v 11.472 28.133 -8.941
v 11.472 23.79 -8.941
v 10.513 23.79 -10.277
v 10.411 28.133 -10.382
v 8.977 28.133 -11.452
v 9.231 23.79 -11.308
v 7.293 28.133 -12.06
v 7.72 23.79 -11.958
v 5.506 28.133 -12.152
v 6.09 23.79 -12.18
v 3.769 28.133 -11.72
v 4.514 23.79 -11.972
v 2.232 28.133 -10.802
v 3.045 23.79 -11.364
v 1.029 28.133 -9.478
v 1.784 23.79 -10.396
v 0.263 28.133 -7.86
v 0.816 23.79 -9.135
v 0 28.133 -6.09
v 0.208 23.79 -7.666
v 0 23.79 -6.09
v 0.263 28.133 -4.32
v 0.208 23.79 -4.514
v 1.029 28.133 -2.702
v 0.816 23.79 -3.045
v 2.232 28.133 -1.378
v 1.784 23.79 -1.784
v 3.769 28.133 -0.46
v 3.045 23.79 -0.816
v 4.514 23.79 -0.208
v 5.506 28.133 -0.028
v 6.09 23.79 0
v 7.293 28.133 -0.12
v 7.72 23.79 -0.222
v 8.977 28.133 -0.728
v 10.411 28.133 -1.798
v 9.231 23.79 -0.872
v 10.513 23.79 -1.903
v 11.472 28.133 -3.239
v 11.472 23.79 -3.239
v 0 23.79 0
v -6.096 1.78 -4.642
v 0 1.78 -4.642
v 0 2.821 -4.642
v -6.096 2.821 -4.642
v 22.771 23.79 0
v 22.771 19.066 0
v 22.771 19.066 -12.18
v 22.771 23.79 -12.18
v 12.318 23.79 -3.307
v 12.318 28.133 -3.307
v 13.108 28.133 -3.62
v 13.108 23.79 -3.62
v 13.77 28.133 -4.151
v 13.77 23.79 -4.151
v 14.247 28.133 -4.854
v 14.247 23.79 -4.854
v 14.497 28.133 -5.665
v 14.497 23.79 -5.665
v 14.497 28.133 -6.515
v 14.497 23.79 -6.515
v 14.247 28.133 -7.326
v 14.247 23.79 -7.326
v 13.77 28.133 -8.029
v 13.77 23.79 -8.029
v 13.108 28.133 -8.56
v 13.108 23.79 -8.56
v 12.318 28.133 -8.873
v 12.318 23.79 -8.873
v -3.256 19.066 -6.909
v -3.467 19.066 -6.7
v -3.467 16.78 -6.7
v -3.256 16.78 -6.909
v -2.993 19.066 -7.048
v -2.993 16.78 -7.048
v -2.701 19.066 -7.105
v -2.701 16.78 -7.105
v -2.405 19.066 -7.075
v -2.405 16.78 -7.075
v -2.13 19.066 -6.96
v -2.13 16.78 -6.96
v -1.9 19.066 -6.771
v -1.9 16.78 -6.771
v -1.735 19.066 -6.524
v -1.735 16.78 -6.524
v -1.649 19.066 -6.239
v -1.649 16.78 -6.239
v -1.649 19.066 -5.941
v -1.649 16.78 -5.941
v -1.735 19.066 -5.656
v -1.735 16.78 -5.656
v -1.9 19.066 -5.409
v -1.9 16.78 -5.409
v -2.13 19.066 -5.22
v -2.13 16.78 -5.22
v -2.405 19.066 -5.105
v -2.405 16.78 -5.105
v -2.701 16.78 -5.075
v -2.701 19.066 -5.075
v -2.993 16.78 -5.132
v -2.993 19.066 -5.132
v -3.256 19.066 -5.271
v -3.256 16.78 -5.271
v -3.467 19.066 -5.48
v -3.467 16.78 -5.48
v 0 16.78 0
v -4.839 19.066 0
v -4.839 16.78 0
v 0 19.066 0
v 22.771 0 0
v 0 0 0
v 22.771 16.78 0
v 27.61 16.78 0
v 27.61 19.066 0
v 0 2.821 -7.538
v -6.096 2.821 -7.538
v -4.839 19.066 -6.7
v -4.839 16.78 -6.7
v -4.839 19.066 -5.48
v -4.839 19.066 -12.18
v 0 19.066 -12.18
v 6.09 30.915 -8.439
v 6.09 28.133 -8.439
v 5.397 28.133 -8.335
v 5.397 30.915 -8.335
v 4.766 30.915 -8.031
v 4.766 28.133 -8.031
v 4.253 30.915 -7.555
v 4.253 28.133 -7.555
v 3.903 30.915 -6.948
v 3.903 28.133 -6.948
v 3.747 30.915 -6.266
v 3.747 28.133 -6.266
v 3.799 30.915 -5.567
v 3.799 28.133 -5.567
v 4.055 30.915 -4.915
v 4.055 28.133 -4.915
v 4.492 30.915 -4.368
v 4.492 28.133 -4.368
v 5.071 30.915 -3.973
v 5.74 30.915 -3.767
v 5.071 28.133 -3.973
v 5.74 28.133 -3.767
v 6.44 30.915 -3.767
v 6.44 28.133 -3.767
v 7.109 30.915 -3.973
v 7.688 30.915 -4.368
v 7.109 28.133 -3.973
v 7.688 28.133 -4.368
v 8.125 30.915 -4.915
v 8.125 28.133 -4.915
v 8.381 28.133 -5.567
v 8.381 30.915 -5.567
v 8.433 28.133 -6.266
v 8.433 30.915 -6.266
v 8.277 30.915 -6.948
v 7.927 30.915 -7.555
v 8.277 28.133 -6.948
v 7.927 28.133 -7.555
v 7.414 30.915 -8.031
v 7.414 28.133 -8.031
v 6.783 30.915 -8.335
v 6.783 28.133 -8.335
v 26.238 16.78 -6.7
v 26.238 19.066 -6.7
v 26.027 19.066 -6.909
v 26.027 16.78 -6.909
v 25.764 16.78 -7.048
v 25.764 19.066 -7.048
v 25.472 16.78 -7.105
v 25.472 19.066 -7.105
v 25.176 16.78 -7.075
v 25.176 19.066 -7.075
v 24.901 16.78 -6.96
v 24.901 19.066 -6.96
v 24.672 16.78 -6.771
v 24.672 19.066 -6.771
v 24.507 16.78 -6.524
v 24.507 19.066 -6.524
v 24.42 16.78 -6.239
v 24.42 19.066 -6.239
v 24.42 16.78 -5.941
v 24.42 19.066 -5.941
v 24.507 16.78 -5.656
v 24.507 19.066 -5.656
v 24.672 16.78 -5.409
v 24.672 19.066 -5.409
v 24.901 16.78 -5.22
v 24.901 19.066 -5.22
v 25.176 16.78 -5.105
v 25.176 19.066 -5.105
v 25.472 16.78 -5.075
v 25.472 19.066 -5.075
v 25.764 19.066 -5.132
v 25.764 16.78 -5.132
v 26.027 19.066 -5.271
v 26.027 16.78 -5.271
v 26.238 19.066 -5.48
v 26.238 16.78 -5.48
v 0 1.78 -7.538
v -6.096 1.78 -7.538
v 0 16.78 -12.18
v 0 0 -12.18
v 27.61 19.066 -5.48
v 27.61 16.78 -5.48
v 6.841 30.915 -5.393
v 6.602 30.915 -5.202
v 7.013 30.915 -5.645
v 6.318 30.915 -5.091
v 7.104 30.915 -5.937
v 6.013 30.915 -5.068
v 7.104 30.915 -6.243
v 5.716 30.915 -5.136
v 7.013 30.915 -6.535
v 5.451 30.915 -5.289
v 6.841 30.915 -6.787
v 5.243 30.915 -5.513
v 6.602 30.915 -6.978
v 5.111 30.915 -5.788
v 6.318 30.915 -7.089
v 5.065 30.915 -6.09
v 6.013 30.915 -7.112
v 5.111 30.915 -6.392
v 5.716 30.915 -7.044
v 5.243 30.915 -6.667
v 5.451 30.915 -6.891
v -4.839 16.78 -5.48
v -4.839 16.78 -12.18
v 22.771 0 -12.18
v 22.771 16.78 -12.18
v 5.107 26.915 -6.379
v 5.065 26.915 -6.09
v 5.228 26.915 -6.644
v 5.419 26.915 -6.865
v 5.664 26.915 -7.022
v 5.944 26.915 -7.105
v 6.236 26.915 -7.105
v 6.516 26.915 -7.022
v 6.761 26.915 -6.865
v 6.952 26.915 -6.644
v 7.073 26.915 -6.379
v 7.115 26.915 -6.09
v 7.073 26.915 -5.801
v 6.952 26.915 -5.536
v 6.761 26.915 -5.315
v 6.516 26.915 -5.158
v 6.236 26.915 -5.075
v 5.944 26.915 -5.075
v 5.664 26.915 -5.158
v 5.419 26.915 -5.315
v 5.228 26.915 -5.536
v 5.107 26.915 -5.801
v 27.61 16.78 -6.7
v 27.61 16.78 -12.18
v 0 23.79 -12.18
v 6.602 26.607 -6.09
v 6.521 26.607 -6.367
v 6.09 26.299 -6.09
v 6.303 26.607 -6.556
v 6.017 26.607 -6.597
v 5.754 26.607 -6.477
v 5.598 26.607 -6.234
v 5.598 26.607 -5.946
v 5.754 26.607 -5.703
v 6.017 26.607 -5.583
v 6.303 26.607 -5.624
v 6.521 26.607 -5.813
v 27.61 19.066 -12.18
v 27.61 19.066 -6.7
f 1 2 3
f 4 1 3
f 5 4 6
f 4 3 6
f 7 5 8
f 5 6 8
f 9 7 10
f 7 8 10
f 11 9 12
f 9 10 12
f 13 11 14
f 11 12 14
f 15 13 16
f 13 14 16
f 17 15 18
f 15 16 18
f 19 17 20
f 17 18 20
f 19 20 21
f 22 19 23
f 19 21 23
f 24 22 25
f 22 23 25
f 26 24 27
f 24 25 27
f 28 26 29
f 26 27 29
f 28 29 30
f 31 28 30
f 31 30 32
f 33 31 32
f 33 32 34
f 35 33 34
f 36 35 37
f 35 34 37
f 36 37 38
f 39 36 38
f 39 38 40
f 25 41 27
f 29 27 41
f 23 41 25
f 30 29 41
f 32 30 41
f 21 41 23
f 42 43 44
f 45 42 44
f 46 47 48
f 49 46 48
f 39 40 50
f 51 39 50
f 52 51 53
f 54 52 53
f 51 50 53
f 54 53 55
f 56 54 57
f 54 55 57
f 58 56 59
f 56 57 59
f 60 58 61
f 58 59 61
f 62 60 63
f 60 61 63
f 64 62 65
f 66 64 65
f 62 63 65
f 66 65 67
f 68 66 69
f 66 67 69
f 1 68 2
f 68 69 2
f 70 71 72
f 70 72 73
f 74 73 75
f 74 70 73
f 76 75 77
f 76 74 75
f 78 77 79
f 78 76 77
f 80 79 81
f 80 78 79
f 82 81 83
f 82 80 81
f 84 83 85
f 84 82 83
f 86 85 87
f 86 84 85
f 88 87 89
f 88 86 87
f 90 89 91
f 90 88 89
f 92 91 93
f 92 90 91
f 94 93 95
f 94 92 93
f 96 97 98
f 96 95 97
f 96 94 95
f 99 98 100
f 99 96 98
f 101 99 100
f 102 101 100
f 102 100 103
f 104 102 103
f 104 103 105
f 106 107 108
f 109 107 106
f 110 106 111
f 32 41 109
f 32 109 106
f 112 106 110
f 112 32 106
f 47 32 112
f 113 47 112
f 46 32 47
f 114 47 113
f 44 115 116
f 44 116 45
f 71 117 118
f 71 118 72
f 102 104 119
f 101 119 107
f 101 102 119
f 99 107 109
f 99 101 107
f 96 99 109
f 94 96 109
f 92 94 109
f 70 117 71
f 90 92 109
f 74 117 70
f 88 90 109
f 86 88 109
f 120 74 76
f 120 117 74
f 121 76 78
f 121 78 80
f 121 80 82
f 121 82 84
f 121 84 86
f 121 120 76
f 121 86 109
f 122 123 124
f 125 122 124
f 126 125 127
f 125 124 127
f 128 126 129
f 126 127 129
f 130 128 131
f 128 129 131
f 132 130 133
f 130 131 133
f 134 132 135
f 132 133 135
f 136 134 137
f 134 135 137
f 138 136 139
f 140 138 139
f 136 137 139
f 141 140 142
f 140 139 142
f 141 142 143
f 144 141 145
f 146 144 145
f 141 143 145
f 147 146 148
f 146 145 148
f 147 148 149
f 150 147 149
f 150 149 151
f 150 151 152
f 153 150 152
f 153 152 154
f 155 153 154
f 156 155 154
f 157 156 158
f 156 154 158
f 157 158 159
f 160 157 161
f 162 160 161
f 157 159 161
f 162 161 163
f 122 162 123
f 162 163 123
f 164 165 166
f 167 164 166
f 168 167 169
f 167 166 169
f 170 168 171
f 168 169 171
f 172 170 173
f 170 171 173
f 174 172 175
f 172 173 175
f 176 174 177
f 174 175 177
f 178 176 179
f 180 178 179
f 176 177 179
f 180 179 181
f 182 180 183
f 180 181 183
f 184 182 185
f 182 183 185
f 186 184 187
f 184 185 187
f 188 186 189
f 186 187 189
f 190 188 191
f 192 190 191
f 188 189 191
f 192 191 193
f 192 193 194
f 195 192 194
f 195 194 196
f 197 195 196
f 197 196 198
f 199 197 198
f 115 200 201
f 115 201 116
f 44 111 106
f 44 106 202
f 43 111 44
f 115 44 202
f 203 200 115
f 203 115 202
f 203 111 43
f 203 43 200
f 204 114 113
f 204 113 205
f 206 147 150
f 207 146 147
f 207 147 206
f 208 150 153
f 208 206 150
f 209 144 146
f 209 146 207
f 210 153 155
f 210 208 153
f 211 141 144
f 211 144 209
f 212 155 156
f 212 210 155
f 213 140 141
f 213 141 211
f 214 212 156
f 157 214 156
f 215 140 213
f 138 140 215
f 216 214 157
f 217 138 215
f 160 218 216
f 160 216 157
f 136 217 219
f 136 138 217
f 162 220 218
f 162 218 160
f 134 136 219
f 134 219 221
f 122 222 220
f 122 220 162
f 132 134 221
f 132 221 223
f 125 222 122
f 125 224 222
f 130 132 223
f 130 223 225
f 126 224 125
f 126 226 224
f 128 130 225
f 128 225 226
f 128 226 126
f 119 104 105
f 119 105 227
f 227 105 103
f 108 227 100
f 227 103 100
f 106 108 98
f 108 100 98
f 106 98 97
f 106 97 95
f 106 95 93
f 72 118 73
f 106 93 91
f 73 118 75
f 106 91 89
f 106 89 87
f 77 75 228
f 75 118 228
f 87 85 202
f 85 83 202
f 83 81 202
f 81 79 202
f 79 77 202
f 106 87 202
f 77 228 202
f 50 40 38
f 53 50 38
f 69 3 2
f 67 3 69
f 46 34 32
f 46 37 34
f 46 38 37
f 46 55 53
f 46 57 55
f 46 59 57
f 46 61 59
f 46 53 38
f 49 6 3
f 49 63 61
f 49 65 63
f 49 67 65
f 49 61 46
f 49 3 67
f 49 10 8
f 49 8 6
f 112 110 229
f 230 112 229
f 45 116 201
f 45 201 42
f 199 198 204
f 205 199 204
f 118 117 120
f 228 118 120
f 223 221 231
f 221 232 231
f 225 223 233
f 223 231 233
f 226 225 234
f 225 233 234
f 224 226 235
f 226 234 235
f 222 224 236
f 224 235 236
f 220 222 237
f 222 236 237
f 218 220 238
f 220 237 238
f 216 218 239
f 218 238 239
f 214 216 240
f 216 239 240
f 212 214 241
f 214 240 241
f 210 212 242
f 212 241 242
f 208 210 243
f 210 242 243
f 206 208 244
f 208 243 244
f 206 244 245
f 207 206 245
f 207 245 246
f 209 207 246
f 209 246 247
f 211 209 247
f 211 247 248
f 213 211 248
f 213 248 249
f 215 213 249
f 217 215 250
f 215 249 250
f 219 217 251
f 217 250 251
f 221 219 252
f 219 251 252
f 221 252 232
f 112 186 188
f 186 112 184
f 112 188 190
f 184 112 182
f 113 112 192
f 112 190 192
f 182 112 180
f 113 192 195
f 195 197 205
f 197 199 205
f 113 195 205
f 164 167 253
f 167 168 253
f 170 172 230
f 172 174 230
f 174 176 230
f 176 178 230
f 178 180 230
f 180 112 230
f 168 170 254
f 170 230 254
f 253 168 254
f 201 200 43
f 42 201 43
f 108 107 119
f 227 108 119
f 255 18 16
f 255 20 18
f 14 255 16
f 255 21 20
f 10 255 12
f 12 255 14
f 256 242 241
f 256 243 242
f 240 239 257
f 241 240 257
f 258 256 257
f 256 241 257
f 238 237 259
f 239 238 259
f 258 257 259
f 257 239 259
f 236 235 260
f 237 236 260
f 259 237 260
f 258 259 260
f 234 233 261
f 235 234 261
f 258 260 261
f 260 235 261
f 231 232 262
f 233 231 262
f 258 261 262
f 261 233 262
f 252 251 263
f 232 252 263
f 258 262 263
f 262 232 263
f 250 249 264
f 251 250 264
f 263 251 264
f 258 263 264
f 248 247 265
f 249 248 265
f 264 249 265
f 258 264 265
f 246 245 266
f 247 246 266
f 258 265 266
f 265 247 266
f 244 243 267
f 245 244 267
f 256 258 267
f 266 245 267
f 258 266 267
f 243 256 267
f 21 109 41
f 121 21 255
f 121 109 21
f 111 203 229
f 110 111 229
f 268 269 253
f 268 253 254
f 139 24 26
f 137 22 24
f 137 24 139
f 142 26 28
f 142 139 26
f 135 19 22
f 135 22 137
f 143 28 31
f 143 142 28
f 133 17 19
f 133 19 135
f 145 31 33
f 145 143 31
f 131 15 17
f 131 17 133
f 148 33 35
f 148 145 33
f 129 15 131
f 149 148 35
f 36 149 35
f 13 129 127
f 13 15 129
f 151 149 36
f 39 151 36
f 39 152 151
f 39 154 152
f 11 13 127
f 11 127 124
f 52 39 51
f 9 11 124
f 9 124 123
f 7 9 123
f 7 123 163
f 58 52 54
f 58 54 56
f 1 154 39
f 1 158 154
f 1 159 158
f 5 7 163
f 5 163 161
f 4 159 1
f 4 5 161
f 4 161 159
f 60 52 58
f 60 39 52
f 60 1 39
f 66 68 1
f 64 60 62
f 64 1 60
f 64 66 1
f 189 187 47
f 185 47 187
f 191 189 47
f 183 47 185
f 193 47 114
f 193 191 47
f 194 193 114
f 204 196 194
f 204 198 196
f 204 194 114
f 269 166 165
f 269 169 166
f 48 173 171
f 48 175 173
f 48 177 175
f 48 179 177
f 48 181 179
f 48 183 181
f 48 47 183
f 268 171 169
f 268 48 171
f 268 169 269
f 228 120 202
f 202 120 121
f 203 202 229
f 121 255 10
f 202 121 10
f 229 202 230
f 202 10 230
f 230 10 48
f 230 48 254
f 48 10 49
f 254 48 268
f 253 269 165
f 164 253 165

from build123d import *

# Parameters (mm, degrees)
SKETCH1_W                    = 22.7711
SKETCH1_H                    = 12.18
BOSS_EXTRUDE1_DEPTH          = 23.79
SKETCH3_W                    = 32.4485
SKETCH3_H                    = 12.18
BOSS_EXTRUDE2_DEPTH          = 2.286
CUT_EXTRUDE1_DEPTH           = 36.695245613
BOSS_EXTRUDE3_DEPTH          = 4.3434
SKETCH6_R                    = 2.3495
BOSS_EXTRUDE4_DEPTH          = 2.7813
SKETCH7_W                    = 2.8956
SKETCH7_H                    = 1.0414
BOSS_EXTRUDE5_DEPTH          = 6.096
M2_5X0_45_TAPPED_HOLE1_D     = 2.05
M2_5X0_45_TAPPED_HOLE1_DEPTH = 4
M2_5X0_45_TAPPED_HOLE1_TIP   = 0.615882135


with BuildPart() as part:
    # Sketch1 → Boss-Extrude1 (new body)
    with BuildSketch(Plane(origin=(0, 0, 0), x_dir=(1, 0, 0), z_dir=(0, 1, 0))):
        with Locations((11.38555, 6.09)):
            Rectangle(SKETCH1_W, SKETCH1_H)
    extrude(amount=BOSS_EXTRUDE1_DEPTH)

    # Sketch3 → Boss-Extrude2 (add)
    with BuildSketch(Plane(origin=(0, 19.0656, 0), x_dir=(1, 0, 0), z_dir=(0, 1, 0))):
        with Locations((11.38555, 6.09)):
            Rectangle(SKETCH3_W, SKETCH3_H)
    extrude(amount=-BOSS_EXTRUDE2_DEPTH)

    # Sketch4 → Cut-Extrude1 (cut, through all)
    with BuildSketch(Plane(origin=(0, 19.0656, 0), x_dir=(1, 0, 0), z_dir=(0, 1, 0))):
        with BuildLine():
            Line((-4.8387, 6.6996), (-3.4671, 6.6996))
            ThreePointArc((-3.4671, 6.6996), (-1.6383, 6.09), (-3.4671, 5.4804))
            Line((-3.4671, 5.4804), (-4.8387, 5.4804))
            Line((-4.8387, 5.4804), (-4.8387, 6.6996))
        make_face()
        with BuildLine():
            Line((26.2382, 5.4804), (27.6098, 5.4804))
            Line((27.6098, 5.4804), (27.6098, 6.6996))
            Line((27.6098, 6.6996), (26.2382, 6.6996))
            ThreePointArc((26.2382, 6.6996), (24.4094, 6.09), (26.2382, 5.4804))
        make_face()
    extrude(amount=-CUT_EXTRUDE1_DEPTH, mode=Mode.SUBTRACT)

    # Sketch5 → Boss-Extrude3 (add)
    with BuildSketch(Plane(origin=(0, 23.79, 0), x_dir=(1, 0, 0), z_dir=(0, 1, 0))):
        with BuildLine():
            ThreePointArc((11.471694537, 8.940519937), (0, 6.09), (11.471694537, 3.239480063))
            ThreePointArc((11.471694537, 3.239480063), (14.5288, 6.09), (11.471694537, 8.940519937))
        make_face()
    extrude(amount=BOSS_EXTRUDE3_DEPTH)

    # Sketch6 → Boss-Extrude4 (add)
    with BuildSketch(Plane(origin=(0, 28.1334, 0), x_dir=(1, 0, 0), z_dir=(0, 1, 0))):
        with Locations((6.09, 6.09)):
            Circle(SKETCH6_R)
    extrude(amount=BOSS_EXTRUDE4_DEPTH)

    # Sketch7 → Boss-Extrude5 (add)
    with BuildSketch(Plane.ZY):
        with Locations((-6.09, 2.3007)):
            Rectangle(SKETCH7_W, SKETCH7_H)
    extrude(amount=BOSS_EXTRUDE5_DEPTH)

    # M2.5x0.45 Tapped Hole1
    with Locations(Plane(origin=(0, 30.9147, 0), x_dir=(1, 0, 0), z_dir=(0, 1, 0))):
        with Locations((6.09, 6.09)):
            Hole(M2_5X0_45_TAPPED_HOLE1_D / 2, depth=M2_5X0_45_TAPPED_HOLE1_DEPTH)
            with Locations((0, 0, -(M2_5X0_45_TAPPED_HOLE1_DEPTH + M2_5X0_45_TAPPED_HOLE1_TIP / 2))):  # 118° drill point
                Cone(0, M2_5X0_45_TAPPED_HOLE1_D / 2, M2_5X0_45_TAPPED_HOLE1_TIP, mode=Mode.SUBTRACT)


solid = part.part
